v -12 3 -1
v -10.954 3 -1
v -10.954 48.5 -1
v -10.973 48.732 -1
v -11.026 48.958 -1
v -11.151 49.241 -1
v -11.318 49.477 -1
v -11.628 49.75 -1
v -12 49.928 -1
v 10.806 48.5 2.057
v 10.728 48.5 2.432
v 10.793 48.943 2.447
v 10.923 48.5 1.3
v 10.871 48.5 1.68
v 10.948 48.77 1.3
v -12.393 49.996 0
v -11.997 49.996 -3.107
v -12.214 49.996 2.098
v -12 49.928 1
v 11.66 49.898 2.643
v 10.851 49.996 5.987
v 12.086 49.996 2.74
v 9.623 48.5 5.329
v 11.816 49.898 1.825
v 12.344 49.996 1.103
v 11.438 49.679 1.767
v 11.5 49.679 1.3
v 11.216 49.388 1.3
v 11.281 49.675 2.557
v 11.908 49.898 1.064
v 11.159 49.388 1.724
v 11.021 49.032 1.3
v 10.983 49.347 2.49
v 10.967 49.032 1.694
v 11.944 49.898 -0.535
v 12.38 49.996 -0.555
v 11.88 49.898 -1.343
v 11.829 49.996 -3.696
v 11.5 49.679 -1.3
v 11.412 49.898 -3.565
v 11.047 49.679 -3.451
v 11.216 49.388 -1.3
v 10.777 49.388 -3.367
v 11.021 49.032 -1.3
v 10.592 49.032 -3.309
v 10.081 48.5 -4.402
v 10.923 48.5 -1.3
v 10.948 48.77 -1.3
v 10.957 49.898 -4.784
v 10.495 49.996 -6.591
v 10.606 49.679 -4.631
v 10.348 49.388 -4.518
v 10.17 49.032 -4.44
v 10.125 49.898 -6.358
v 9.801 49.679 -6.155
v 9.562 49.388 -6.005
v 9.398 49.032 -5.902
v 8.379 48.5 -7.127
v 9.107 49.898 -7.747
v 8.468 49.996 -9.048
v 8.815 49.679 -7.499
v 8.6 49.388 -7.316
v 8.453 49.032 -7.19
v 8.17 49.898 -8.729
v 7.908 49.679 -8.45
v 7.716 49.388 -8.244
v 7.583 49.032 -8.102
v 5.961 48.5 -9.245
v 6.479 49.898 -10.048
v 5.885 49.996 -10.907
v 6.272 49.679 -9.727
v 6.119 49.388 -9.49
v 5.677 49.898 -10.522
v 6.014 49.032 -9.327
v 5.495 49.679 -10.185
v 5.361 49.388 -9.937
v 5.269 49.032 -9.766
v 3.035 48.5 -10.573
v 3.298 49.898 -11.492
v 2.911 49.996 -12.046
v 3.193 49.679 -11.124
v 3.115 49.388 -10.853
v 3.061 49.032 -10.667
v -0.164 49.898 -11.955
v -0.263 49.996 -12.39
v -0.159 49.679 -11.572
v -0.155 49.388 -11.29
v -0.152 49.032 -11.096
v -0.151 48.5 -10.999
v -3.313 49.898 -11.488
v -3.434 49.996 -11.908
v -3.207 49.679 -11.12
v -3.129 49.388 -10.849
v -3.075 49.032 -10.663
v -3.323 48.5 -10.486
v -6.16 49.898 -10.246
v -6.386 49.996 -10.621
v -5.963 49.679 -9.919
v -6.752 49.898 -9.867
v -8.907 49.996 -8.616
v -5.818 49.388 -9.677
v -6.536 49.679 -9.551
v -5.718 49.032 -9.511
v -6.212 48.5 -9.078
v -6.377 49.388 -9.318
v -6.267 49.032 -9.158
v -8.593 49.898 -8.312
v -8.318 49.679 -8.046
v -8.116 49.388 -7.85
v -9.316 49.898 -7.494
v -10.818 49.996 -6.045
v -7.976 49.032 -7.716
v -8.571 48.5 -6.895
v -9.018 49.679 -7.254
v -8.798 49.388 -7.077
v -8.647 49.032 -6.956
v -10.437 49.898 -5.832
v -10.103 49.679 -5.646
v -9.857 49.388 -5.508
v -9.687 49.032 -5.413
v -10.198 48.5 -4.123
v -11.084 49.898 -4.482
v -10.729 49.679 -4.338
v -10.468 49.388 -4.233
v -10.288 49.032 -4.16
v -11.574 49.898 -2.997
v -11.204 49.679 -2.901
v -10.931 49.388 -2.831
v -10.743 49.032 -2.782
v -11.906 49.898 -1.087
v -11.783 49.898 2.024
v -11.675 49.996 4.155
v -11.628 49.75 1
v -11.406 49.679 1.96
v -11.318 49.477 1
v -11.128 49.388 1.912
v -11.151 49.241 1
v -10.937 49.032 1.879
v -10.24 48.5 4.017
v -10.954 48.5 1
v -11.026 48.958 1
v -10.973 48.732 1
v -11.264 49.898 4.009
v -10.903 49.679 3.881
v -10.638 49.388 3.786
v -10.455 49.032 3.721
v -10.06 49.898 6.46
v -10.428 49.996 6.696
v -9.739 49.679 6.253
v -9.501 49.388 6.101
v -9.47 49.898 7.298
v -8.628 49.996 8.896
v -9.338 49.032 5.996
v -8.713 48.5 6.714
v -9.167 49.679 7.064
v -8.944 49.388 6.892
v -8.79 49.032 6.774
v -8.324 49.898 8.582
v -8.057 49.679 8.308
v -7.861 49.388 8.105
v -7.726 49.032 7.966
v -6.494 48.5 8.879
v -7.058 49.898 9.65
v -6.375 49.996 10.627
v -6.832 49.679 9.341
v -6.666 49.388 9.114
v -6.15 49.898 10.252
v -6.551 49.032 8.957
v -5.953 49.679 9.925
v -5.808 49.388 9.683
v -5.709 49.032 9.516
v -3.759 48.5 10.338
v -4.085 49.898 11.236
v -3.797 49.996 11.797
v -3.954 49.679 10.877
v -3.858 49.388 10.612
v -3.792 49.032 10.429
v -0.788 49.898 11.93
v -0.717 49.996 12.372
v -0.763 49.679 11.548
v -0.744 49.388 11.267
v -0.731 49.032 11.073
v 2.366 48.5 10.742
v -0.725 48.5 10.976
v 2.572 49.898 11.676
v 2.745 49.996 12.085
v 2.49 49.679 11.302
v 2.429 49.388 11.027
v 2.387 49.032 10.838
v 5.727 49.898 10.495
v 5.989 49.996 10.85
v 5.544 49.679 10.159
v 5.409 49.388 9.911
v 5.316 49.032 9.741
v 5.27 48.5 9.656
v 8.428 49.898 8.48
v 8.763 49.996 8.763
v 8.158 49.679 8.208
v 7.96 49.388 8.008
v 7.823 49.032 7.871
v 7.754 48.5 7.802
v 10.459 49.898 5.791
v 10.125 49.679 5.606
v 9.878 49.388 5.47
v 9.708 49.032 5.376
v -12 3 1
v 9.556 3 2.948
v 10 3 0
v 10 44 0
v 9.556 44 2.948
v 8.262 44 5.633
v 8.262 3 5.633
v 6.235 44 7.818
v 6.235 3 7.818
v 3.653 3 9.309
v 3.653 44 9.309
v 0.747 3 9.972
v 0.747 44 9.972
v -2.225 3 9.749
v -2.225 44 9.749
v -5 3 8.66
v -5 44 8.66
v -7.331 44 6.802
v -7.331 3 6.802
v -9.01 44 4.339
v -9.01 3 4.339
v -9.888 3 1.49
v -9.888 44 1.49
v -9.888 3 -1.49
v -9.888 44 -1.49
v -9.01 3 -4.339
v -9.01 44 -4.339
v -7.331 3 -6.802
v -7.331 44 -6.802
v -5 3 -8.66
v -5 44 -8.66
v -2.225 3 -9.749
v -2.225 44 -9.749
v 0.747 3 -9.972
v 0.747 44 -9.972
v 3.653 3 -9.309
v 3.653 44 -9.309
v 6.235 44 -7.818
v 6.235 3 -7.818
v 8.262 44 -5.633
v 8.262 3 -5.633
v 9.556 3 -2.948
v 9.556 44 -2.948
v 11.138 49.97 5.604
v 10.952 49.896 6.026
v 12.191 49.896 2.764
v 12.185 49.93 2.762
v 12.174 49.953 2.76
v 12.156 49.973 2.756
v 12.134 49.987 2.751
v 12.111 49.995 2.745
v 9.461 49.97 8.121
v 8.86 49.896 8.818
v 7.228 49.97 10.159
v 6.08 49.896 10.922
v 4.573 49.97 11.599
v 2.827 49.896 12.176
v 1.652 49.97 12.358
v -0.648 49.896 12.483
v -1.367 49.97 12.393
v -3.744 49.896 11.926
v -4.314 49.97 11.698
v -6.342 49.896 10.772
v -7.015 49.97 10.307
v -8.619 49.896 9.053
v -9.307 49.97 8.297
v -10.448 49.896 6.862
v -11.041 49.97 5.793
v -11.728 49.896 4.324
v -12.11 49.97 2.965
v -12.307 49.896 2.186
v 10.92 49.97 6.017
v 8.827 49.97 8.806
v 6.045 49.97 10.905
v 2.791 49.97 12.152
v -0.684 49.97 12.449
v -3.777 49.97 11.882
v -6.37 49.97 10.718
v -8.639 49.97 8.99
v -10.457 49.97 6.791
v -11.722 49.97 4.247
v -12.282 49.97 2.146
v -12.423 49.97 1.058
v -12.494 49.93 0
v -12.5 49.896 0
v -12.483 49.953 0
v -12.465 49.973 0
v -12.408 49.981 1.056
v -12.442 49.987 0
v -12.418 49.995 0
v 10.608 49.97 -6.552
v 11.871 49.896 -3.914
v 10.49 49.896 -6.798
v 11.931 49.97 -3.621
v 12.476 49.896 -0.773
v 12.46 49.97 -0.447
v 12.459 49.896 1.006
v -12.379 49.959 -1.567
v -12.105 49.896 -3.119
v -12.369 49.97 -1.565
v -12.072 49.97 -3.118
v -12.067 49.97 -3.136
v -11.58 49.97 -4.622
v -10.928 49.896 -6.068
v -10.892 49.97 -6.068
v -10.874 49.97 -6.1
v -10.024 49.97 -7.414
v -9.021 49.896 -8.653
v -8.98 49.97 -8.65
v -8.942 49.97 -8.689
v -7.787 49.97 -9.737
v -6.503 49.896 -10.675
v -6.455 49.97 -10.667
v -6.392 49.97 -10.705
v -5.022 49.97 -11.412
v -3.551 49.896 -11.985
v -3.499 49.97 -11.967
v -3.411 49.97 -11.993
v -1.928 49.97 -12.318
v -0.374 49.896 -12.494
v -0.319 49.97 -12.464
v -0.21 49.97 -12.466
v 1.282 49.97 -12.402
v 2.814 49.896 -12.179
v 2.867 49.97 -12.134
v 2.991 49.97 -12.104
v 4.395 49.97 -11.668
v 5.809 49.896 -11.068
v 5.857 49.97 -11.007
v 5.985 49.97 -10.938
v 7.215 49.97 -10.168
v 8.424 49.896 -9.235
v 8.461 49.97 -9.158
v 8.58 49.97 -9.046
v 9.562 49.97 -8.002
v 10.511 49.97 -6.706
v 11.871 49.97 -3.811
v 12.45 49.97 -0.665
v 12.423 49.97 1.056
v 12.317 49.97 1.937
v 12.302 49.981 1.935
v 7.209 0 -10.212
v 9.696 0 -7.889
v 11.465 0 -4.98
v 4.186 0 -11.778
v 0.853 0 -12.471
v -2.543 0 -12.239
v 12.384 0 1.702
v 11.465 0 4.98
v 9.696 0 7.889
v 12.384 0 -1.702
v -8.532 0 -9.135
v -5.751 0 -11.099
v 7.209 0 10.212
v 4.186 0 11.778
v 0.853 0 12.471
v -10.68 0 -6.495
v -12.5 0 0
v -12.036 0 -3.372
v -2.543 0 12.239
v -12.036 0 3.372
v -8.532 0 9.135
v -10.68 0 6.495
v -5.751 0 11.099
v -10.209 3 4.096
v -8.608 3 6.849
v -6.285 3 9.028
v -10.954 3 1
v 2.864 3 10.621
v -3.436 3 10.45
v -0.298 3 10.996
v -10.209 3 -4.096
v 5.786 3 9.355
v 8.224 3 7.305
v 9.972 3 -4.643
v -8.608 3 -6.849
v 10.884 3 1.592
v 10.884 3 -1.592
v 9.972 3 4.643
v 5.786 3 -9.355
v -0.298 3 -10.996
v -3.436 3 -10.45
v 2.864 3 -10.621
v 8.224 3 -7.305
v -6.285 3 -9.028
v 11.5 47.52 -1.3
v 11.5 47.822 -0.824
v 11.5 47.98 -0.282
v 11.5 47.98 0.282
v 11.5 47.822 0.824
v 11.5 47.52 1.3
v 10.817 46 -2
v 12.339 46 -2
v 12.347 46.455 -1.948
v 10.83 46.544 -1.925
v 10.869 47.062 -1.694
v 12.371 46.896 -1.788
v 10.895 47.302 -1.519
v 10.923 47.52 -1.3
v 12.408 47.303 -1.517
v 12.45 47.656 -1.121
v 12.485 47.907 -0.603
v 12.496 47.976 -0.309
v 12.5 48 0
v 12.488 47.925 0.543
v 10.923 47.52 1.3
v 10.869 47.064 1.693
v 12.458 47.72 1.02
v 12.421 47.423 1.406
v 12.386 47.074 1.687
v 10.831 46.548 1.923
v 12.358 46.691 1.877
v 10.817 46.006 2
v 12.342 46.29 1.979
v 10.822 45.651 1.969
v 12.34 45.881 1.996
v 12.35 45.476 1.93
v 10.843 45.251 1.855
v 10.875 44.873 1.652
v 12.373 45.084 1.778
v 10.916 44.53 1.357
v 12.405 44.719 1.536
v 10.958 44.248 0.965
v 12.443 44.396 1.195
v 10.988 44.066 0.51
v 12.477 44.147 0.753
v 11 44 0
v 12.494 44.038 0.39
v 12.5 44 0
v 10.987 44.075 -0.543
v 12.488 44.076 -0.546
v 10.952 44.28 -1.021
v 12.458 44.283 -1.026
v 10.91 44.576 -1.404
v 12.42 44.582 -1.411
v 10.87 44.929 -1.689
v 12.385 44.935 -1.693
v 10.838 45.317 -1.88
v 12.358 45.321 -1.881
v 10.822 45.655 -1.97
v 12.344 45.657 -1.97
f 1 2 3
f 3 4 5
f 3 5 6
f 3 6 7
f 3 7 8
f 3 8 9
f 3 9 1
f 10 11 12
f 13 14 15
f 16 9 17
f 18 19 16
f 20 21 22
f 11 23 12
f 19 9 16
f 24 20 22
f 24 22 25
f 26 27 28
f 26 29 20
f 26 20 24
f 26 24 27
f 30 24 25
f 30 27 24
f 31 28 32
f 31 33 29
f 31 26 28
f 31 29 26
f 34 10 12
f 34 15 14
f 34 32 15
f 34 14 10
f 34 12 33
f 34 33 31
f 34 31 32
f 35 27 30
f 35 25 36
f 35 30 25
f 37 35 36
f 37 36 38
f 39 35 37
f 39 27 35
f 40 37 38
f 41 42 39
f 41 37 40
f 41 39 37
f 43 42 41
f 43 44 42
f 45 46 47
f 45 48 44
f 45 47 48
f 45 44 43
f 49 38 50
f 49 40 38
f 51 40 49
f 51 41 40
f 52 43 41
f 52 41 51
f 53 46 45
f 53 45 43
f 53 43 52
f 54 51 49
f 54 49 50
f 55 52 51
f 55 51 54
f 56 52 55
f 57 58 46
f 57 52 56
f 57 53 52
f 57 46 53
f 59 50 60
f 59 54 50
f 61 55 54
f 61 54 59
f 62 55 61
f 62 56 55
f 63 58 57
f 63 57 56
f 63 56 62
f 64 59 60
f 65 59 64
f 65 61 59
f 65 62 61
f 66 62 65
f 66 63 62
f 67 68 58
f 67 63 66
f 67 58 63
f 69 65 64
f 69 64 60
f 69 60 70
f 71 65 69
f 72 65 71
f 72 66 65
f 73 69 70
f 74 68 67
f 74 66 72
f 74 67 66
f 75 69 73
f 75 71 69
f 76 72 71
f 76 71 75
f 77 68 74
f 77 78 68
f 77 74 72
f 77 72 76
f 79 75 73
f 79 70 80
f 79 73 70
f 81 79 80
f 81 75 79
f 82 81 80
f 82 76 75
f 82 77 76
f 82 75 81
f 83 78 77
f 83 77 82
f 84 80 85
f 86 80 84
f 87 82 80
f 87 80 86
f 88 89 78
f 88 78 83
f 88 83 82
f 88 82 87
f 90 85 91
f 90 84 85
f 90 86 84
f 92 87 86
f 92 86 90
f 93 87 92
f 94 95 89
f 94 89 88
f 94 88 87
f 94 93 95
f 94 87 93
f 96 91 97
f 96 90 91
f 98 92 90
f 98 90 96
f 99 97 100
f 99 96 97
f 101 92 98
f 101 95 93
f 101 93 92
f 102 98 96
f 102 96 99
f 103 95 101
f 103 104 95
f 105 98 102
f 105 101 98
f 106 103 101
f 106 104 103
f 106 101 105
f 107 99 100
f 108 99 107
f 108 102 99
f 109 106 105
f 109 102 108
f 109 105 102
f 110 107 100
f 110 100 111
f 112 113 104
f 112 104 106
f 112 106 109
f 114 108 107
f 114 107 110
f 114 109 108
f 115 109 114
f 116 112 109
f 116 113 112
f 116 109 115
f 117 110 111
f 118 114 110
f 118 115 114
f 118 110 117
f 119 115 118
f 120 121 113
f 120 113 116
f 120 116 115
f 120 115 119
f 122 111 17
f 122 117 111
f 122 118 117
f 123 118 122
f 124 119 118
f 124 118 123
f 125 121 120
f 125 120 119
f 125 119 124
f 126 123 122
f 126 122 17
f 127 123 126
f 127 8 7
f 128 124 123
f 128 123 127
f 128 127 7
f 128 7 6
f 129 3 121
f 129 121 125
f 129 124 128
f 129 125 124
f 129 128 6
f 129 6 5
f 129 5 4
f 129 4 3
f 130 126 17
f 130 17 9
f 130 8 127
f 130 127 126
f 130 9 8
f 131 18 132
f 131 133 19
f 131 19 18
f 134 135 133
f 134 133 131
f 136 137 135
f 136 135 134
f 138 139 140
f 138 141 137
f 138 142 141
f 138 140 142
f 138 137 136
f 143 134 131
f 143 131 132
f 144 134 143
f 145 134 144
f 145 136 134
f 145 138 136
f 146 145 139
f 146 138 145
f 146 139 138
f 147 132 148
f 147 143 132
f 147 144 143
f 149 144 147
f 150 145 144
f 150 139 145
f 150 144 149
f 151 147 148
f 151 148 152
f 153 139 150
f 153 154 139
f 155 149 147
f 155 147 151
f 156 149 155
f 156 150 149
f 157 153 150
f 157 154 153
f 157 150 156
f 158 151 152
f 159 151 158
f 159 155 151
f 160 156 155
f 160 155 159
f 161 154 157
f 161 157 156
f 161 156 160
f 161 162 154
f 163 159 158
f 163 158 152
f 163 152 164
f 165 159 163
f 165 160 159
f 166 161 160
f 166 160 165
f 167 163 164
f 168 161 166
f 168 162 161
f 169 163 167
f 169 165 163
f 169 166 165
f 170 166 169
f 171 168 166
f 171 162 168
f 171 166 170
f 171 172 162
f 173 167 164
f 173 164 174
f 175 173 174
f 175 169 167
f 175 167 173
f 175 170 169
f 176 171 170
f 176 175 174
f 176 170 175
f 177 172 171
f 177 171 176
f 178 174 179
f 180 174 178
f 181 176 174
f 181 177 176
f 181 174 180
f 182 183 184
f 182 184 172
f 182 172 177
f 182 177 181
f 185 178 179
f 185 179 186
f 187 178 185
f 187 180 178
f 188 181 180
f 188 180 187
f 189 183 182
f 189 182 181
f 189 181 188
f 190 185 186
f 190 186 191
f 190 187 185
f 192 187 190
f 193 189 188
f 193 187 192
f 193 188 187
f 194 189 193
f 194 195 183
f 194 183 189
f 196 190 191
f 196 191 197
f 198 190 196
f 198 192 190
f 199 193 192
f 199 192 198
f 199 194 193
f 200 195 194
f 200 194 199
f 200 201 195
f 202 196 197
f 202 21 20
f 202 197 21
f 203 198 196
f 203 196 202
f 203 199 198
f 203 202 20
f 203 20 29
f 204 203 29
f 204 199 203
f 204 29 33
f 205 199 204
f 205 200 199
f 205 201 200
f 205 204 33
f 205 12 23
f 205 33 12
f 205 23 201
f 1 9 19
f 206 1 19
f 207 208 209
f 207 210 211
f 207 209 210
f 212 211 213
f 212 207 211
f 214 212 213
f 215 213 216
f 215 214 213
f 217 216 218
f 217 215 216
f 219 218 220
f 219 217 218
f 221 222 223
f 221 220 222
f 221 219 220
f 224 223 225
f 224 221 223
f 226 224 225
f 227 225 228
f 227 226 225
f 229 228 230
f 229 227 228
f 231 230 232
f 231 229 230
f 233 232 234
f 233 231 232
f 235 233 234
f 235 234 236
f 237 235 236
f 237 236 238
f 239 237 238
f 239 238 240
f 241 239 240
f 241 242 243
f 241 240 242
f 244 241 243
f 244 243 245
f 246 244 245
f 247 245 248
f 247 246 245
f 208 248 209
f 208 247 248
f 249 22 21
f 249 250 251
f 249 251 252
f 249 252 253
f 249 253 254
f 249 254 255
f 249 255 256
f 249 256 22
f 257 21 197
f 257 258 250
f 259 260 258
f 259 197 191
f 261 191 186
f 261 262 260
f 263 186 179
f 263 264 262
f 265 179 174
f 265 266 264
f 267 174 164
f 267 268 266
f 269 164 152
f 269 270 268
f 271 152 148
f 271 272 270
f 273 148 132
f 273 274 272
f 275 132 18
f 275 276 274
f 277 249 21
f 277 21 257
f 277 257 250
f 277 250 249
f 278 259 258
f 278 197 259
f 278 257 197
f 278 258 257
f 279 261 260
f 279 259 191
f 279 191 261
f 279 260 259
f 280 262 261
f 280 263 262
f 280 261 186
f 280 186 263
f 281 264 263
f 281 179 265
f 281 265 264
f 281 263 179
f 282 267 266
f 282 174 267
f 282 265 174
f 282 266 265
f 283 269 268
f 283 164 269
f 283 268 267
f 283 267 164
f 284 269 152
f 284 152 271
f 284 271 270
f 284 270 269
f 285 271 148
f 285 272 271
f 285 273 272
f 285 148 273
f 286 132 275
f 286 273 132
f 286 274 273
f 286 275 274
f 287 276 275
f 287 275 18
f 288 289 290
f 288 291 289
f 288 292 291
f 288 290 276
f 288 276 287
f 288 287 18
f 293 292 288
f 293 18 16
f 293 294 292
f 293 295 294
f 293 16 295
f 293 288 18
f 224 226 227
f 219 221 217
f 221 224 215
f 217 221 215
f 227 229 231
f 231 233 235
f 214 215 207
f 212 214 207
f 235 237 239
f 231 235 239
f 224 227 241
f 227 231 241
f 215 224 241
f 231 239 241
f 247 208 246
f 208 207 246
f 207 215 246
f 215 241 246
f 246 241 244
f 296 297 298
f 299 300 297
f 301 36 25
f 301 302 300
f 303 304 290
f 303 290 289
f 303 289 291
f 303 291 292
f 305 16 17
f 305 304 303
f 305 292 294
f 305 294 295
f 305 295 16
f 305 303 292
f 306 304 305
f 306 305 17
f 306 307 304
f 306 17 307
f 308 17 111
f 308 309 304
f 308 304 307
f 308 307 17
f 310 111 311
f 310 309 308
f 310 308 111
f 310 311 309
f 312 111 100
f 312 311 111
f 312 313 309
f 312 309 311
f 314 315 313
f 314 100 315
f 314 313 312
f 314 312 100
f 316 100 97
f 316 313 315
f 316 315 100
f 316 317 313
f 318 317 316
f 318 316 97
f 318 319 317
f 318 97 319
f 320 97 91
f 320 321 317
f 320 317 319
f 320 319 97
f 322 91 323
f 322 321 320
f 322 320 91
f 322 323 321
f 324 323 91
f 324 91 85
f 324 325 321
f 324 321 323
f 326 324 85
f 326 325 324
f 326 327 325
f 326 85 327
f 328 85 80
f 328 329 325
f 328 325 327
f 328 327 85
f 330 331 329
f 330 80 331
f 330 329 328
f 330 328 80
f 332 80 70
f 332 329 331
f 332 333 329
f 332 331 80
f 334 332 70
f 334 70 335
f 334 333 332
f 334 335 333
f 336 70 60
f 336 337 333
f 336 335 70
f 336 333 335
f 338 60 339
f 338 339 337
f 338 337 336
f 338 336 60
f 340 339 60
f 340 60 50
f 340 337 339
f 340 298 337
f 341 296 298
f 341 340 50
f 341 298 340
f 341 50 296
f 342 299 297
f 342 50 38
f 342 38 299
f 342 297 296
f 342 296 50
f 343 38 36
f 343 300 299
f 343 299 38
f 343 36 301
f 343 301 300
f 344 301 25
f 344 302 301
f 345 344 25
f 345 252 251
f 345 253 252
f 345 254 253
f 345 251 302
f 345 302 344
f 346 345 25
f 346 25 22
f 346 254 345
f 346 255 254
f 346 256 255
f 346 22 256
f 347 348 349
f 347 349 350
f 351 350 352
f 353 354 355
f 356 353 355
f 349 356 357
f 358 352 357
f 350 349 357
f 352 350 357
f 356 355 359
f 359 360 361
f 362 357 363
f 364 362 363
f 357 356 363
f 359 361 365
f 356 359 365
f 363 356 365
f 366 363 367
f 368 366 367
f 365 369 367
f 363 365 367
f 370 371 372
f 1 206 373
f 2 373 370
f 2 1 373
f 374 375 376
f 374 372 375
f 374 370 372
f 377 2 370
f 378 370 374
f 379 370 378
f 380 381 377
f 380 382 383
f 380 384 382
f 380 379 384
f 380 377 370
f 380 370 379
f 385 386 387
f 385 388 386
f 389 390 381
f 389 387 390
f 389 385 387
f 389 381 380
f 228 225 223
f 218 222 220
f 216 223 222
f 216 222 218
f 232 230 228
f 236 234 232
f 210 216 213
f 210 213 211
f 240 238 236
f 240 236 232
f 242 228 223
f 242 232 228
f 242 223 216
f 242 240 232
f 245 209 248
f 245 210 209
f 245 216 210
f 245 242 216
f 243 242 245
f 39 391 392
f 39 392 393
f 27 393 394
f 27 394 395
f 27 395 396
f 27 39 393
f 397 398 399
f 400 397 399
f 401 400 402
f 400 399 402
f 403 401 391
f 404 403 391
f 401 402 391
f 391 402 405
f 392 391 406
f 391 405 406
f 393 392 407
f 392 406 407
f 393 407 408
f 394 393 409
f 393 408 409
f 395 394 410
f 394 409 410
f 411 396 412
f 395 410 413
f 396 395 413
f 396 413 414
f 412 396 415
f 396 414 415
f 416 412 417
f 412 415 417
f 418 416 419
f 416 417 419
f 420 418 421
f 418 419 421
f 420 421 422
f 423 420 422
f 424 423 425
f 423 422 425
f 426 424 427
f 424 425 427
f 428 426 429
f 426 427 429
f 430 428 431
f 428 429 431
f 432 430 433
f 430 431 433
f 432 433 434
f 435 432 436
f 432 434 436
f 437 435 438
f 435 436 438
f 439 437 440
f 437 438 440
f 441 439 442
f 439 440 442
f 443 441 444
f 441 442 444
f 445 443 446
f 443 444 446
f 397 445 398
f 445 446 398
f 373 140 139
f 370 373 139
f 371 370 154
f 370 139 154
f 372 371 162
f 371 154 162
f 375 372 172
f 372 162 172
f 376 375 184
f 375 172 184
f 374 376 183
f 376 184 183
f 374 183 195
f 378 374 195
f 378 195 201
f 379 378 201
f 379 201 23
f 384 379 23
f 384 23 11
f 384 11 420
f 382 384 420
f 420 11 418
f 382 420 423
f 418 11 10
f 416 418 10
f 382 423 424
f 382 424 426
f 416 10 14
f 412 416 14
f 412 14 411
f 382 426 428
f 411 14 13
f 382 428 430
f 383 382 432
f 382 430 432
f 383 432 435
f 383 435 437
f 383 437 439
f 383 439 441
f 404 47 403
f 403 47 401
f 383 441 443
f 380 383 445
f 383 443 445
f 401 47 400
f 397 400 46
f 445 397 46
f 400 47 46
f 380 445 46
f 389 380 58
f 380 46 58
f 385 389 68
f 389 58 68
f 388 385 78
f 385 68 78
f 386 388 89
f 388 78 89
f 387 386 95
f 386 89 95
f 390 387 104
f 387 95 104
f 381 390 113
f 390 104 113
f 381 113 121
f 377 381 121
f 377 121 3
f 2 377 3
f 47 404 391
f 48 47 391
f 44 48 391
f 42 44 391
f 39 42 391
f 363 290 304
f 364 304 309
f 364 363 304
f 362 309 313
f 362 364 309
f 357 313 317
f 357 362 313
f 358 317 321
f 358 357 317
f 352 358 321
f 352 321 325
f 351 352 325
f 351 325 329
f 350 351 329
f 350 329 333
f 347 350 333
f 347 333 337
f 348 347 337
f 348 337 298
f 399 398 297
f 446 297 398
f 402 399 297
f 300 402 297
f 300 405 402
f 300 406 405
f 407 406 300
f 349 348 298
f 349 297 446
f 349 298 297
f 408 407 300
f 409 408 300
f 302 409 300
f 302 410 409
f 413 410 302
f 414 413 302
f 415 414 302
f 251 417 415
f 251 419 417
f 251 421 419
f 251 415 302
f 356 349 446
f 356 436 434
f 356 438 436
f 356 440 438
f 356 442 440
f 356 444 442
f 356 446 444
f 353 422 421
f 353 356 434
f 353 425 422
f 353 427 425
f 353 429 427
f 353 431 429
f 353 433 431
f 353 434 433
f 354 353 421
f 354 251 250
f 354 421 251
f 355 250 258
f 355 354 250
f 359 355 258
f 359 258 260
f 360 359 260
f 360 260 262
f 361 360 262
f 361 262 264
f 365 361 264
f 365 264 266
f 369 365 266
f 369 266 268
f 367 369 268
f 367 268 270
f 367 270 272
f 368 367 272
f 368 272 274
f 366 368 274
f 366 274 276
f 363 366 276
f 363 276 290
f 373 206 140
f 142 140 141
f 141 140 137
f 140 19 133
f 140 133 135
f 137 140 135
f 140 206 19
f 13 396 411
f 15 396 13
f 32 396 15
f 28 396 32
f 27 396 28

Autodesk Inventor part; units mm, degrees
ref_plane "YZ Plane" through (0, 0, 0) normal (1, 0, 0) x (0, 1, 0)
ref_plane "XZ Plane" through (0, 0, 0) normal (0, 1, 0) x (-1, 0, 0)
sketch "Sketch1" plane through (0, 0, 0) normal (0, 1, 0) x (-1, 0, 0)
  circle A0 centre (0, 0) radius 12.5
  dimension "d0" = 25
extrude "Extrusion1" add sketch "Sketch1" along normal blind 50
sketch "Sketch2" plane through (0, 50, 0) normal (0, 1, 0) x (1, 0, 0)
  circle A0 centre (0, 0) radius 11
  circle A1 centre (0, 0) radius 12.5 projected
  line L0 (-12, -1) -> (-10.9545, -1)
  line L1 (-10.9545, 1) -> (-12, 1)
  line L2 (-12, 1) -> (-12, -1)
  point P0 (-12, 0)
  dimension "d3" = 22
  dimension "d4" = 12
  dimension "d5" = 1
  dimension "d6" = 1
  dimension "d7" = 1.0455
extrude "Extrusion2" cut sketch "Sketch2" against normal blind 47 contours A0 | A0 L0 L2 L1
sketch "Sketch3" plane through (0, 3, 0) normal (0, 1, 0) x (1, 0, 0)
  circle A0 centre (0, 0) radius 10
  arc A1 (-10.9545, -1) -> (-10.9545, 1) centre (0, 0) ccw projected
  dimension "d10" = 20
extrude "Extrusion3" add sketch "Sketch3" along normal blind 41 separate body
ref_plane "Work Plane1" through (12.5, 0, 0) normal (1, 0, 0) x (0, 0, -1)
sketch "Sketch4" plane through (12.5, 0, 0) normal (1, 0, 0) x (0, 0, -1)
  circle A0 centre (0, 46) radius 2
  line L0 (-11, 50) -> (11, 50) projected
  point P0 (0, 0)
  point P1 (0, 50)
  point P2 (1, 50)
  point P3 (-1, 50)
  dimension "d13" = 4
  dimension "d14" = 4
extrude "Extrusion4" cut sketch "Sketch4" against normal blind 3
sketch "Sketch5" plane through (0, 50, 0) normal (0, 1, 0) x (1, 0, 0)
  line L0 (11.5, -1.3) -> (10.9229, -1.3)
  line L1 (10.9229, 1.3) -> (11.5, 1.3)
  line L2 (11.5, 1.3) -> (11.5, -1.3)
  arc A0 (-10.9545, -1) -> (-10.9545, 1) centre (0, 0) ccw projected
  point P0 (11, 0)
  dimension "d17" = 1.3
  dimension "d18" = 1.3
  dimension "d19" = 0.5
extrude "Extrusion5" cut sketch "Sketch5" against normal blind 3
fillet "Fillet1" radius 1.5 2 edges at (-0.1508, 50, -10.999) (-0.1508, 50, 10.999)
fillet "Fillet2" radius 0.1 2 edges at (-1.3904, 50, 12.4224) (1.3904, 50, -12.4224)
properties part number "V1.0-battery-holder-A"
